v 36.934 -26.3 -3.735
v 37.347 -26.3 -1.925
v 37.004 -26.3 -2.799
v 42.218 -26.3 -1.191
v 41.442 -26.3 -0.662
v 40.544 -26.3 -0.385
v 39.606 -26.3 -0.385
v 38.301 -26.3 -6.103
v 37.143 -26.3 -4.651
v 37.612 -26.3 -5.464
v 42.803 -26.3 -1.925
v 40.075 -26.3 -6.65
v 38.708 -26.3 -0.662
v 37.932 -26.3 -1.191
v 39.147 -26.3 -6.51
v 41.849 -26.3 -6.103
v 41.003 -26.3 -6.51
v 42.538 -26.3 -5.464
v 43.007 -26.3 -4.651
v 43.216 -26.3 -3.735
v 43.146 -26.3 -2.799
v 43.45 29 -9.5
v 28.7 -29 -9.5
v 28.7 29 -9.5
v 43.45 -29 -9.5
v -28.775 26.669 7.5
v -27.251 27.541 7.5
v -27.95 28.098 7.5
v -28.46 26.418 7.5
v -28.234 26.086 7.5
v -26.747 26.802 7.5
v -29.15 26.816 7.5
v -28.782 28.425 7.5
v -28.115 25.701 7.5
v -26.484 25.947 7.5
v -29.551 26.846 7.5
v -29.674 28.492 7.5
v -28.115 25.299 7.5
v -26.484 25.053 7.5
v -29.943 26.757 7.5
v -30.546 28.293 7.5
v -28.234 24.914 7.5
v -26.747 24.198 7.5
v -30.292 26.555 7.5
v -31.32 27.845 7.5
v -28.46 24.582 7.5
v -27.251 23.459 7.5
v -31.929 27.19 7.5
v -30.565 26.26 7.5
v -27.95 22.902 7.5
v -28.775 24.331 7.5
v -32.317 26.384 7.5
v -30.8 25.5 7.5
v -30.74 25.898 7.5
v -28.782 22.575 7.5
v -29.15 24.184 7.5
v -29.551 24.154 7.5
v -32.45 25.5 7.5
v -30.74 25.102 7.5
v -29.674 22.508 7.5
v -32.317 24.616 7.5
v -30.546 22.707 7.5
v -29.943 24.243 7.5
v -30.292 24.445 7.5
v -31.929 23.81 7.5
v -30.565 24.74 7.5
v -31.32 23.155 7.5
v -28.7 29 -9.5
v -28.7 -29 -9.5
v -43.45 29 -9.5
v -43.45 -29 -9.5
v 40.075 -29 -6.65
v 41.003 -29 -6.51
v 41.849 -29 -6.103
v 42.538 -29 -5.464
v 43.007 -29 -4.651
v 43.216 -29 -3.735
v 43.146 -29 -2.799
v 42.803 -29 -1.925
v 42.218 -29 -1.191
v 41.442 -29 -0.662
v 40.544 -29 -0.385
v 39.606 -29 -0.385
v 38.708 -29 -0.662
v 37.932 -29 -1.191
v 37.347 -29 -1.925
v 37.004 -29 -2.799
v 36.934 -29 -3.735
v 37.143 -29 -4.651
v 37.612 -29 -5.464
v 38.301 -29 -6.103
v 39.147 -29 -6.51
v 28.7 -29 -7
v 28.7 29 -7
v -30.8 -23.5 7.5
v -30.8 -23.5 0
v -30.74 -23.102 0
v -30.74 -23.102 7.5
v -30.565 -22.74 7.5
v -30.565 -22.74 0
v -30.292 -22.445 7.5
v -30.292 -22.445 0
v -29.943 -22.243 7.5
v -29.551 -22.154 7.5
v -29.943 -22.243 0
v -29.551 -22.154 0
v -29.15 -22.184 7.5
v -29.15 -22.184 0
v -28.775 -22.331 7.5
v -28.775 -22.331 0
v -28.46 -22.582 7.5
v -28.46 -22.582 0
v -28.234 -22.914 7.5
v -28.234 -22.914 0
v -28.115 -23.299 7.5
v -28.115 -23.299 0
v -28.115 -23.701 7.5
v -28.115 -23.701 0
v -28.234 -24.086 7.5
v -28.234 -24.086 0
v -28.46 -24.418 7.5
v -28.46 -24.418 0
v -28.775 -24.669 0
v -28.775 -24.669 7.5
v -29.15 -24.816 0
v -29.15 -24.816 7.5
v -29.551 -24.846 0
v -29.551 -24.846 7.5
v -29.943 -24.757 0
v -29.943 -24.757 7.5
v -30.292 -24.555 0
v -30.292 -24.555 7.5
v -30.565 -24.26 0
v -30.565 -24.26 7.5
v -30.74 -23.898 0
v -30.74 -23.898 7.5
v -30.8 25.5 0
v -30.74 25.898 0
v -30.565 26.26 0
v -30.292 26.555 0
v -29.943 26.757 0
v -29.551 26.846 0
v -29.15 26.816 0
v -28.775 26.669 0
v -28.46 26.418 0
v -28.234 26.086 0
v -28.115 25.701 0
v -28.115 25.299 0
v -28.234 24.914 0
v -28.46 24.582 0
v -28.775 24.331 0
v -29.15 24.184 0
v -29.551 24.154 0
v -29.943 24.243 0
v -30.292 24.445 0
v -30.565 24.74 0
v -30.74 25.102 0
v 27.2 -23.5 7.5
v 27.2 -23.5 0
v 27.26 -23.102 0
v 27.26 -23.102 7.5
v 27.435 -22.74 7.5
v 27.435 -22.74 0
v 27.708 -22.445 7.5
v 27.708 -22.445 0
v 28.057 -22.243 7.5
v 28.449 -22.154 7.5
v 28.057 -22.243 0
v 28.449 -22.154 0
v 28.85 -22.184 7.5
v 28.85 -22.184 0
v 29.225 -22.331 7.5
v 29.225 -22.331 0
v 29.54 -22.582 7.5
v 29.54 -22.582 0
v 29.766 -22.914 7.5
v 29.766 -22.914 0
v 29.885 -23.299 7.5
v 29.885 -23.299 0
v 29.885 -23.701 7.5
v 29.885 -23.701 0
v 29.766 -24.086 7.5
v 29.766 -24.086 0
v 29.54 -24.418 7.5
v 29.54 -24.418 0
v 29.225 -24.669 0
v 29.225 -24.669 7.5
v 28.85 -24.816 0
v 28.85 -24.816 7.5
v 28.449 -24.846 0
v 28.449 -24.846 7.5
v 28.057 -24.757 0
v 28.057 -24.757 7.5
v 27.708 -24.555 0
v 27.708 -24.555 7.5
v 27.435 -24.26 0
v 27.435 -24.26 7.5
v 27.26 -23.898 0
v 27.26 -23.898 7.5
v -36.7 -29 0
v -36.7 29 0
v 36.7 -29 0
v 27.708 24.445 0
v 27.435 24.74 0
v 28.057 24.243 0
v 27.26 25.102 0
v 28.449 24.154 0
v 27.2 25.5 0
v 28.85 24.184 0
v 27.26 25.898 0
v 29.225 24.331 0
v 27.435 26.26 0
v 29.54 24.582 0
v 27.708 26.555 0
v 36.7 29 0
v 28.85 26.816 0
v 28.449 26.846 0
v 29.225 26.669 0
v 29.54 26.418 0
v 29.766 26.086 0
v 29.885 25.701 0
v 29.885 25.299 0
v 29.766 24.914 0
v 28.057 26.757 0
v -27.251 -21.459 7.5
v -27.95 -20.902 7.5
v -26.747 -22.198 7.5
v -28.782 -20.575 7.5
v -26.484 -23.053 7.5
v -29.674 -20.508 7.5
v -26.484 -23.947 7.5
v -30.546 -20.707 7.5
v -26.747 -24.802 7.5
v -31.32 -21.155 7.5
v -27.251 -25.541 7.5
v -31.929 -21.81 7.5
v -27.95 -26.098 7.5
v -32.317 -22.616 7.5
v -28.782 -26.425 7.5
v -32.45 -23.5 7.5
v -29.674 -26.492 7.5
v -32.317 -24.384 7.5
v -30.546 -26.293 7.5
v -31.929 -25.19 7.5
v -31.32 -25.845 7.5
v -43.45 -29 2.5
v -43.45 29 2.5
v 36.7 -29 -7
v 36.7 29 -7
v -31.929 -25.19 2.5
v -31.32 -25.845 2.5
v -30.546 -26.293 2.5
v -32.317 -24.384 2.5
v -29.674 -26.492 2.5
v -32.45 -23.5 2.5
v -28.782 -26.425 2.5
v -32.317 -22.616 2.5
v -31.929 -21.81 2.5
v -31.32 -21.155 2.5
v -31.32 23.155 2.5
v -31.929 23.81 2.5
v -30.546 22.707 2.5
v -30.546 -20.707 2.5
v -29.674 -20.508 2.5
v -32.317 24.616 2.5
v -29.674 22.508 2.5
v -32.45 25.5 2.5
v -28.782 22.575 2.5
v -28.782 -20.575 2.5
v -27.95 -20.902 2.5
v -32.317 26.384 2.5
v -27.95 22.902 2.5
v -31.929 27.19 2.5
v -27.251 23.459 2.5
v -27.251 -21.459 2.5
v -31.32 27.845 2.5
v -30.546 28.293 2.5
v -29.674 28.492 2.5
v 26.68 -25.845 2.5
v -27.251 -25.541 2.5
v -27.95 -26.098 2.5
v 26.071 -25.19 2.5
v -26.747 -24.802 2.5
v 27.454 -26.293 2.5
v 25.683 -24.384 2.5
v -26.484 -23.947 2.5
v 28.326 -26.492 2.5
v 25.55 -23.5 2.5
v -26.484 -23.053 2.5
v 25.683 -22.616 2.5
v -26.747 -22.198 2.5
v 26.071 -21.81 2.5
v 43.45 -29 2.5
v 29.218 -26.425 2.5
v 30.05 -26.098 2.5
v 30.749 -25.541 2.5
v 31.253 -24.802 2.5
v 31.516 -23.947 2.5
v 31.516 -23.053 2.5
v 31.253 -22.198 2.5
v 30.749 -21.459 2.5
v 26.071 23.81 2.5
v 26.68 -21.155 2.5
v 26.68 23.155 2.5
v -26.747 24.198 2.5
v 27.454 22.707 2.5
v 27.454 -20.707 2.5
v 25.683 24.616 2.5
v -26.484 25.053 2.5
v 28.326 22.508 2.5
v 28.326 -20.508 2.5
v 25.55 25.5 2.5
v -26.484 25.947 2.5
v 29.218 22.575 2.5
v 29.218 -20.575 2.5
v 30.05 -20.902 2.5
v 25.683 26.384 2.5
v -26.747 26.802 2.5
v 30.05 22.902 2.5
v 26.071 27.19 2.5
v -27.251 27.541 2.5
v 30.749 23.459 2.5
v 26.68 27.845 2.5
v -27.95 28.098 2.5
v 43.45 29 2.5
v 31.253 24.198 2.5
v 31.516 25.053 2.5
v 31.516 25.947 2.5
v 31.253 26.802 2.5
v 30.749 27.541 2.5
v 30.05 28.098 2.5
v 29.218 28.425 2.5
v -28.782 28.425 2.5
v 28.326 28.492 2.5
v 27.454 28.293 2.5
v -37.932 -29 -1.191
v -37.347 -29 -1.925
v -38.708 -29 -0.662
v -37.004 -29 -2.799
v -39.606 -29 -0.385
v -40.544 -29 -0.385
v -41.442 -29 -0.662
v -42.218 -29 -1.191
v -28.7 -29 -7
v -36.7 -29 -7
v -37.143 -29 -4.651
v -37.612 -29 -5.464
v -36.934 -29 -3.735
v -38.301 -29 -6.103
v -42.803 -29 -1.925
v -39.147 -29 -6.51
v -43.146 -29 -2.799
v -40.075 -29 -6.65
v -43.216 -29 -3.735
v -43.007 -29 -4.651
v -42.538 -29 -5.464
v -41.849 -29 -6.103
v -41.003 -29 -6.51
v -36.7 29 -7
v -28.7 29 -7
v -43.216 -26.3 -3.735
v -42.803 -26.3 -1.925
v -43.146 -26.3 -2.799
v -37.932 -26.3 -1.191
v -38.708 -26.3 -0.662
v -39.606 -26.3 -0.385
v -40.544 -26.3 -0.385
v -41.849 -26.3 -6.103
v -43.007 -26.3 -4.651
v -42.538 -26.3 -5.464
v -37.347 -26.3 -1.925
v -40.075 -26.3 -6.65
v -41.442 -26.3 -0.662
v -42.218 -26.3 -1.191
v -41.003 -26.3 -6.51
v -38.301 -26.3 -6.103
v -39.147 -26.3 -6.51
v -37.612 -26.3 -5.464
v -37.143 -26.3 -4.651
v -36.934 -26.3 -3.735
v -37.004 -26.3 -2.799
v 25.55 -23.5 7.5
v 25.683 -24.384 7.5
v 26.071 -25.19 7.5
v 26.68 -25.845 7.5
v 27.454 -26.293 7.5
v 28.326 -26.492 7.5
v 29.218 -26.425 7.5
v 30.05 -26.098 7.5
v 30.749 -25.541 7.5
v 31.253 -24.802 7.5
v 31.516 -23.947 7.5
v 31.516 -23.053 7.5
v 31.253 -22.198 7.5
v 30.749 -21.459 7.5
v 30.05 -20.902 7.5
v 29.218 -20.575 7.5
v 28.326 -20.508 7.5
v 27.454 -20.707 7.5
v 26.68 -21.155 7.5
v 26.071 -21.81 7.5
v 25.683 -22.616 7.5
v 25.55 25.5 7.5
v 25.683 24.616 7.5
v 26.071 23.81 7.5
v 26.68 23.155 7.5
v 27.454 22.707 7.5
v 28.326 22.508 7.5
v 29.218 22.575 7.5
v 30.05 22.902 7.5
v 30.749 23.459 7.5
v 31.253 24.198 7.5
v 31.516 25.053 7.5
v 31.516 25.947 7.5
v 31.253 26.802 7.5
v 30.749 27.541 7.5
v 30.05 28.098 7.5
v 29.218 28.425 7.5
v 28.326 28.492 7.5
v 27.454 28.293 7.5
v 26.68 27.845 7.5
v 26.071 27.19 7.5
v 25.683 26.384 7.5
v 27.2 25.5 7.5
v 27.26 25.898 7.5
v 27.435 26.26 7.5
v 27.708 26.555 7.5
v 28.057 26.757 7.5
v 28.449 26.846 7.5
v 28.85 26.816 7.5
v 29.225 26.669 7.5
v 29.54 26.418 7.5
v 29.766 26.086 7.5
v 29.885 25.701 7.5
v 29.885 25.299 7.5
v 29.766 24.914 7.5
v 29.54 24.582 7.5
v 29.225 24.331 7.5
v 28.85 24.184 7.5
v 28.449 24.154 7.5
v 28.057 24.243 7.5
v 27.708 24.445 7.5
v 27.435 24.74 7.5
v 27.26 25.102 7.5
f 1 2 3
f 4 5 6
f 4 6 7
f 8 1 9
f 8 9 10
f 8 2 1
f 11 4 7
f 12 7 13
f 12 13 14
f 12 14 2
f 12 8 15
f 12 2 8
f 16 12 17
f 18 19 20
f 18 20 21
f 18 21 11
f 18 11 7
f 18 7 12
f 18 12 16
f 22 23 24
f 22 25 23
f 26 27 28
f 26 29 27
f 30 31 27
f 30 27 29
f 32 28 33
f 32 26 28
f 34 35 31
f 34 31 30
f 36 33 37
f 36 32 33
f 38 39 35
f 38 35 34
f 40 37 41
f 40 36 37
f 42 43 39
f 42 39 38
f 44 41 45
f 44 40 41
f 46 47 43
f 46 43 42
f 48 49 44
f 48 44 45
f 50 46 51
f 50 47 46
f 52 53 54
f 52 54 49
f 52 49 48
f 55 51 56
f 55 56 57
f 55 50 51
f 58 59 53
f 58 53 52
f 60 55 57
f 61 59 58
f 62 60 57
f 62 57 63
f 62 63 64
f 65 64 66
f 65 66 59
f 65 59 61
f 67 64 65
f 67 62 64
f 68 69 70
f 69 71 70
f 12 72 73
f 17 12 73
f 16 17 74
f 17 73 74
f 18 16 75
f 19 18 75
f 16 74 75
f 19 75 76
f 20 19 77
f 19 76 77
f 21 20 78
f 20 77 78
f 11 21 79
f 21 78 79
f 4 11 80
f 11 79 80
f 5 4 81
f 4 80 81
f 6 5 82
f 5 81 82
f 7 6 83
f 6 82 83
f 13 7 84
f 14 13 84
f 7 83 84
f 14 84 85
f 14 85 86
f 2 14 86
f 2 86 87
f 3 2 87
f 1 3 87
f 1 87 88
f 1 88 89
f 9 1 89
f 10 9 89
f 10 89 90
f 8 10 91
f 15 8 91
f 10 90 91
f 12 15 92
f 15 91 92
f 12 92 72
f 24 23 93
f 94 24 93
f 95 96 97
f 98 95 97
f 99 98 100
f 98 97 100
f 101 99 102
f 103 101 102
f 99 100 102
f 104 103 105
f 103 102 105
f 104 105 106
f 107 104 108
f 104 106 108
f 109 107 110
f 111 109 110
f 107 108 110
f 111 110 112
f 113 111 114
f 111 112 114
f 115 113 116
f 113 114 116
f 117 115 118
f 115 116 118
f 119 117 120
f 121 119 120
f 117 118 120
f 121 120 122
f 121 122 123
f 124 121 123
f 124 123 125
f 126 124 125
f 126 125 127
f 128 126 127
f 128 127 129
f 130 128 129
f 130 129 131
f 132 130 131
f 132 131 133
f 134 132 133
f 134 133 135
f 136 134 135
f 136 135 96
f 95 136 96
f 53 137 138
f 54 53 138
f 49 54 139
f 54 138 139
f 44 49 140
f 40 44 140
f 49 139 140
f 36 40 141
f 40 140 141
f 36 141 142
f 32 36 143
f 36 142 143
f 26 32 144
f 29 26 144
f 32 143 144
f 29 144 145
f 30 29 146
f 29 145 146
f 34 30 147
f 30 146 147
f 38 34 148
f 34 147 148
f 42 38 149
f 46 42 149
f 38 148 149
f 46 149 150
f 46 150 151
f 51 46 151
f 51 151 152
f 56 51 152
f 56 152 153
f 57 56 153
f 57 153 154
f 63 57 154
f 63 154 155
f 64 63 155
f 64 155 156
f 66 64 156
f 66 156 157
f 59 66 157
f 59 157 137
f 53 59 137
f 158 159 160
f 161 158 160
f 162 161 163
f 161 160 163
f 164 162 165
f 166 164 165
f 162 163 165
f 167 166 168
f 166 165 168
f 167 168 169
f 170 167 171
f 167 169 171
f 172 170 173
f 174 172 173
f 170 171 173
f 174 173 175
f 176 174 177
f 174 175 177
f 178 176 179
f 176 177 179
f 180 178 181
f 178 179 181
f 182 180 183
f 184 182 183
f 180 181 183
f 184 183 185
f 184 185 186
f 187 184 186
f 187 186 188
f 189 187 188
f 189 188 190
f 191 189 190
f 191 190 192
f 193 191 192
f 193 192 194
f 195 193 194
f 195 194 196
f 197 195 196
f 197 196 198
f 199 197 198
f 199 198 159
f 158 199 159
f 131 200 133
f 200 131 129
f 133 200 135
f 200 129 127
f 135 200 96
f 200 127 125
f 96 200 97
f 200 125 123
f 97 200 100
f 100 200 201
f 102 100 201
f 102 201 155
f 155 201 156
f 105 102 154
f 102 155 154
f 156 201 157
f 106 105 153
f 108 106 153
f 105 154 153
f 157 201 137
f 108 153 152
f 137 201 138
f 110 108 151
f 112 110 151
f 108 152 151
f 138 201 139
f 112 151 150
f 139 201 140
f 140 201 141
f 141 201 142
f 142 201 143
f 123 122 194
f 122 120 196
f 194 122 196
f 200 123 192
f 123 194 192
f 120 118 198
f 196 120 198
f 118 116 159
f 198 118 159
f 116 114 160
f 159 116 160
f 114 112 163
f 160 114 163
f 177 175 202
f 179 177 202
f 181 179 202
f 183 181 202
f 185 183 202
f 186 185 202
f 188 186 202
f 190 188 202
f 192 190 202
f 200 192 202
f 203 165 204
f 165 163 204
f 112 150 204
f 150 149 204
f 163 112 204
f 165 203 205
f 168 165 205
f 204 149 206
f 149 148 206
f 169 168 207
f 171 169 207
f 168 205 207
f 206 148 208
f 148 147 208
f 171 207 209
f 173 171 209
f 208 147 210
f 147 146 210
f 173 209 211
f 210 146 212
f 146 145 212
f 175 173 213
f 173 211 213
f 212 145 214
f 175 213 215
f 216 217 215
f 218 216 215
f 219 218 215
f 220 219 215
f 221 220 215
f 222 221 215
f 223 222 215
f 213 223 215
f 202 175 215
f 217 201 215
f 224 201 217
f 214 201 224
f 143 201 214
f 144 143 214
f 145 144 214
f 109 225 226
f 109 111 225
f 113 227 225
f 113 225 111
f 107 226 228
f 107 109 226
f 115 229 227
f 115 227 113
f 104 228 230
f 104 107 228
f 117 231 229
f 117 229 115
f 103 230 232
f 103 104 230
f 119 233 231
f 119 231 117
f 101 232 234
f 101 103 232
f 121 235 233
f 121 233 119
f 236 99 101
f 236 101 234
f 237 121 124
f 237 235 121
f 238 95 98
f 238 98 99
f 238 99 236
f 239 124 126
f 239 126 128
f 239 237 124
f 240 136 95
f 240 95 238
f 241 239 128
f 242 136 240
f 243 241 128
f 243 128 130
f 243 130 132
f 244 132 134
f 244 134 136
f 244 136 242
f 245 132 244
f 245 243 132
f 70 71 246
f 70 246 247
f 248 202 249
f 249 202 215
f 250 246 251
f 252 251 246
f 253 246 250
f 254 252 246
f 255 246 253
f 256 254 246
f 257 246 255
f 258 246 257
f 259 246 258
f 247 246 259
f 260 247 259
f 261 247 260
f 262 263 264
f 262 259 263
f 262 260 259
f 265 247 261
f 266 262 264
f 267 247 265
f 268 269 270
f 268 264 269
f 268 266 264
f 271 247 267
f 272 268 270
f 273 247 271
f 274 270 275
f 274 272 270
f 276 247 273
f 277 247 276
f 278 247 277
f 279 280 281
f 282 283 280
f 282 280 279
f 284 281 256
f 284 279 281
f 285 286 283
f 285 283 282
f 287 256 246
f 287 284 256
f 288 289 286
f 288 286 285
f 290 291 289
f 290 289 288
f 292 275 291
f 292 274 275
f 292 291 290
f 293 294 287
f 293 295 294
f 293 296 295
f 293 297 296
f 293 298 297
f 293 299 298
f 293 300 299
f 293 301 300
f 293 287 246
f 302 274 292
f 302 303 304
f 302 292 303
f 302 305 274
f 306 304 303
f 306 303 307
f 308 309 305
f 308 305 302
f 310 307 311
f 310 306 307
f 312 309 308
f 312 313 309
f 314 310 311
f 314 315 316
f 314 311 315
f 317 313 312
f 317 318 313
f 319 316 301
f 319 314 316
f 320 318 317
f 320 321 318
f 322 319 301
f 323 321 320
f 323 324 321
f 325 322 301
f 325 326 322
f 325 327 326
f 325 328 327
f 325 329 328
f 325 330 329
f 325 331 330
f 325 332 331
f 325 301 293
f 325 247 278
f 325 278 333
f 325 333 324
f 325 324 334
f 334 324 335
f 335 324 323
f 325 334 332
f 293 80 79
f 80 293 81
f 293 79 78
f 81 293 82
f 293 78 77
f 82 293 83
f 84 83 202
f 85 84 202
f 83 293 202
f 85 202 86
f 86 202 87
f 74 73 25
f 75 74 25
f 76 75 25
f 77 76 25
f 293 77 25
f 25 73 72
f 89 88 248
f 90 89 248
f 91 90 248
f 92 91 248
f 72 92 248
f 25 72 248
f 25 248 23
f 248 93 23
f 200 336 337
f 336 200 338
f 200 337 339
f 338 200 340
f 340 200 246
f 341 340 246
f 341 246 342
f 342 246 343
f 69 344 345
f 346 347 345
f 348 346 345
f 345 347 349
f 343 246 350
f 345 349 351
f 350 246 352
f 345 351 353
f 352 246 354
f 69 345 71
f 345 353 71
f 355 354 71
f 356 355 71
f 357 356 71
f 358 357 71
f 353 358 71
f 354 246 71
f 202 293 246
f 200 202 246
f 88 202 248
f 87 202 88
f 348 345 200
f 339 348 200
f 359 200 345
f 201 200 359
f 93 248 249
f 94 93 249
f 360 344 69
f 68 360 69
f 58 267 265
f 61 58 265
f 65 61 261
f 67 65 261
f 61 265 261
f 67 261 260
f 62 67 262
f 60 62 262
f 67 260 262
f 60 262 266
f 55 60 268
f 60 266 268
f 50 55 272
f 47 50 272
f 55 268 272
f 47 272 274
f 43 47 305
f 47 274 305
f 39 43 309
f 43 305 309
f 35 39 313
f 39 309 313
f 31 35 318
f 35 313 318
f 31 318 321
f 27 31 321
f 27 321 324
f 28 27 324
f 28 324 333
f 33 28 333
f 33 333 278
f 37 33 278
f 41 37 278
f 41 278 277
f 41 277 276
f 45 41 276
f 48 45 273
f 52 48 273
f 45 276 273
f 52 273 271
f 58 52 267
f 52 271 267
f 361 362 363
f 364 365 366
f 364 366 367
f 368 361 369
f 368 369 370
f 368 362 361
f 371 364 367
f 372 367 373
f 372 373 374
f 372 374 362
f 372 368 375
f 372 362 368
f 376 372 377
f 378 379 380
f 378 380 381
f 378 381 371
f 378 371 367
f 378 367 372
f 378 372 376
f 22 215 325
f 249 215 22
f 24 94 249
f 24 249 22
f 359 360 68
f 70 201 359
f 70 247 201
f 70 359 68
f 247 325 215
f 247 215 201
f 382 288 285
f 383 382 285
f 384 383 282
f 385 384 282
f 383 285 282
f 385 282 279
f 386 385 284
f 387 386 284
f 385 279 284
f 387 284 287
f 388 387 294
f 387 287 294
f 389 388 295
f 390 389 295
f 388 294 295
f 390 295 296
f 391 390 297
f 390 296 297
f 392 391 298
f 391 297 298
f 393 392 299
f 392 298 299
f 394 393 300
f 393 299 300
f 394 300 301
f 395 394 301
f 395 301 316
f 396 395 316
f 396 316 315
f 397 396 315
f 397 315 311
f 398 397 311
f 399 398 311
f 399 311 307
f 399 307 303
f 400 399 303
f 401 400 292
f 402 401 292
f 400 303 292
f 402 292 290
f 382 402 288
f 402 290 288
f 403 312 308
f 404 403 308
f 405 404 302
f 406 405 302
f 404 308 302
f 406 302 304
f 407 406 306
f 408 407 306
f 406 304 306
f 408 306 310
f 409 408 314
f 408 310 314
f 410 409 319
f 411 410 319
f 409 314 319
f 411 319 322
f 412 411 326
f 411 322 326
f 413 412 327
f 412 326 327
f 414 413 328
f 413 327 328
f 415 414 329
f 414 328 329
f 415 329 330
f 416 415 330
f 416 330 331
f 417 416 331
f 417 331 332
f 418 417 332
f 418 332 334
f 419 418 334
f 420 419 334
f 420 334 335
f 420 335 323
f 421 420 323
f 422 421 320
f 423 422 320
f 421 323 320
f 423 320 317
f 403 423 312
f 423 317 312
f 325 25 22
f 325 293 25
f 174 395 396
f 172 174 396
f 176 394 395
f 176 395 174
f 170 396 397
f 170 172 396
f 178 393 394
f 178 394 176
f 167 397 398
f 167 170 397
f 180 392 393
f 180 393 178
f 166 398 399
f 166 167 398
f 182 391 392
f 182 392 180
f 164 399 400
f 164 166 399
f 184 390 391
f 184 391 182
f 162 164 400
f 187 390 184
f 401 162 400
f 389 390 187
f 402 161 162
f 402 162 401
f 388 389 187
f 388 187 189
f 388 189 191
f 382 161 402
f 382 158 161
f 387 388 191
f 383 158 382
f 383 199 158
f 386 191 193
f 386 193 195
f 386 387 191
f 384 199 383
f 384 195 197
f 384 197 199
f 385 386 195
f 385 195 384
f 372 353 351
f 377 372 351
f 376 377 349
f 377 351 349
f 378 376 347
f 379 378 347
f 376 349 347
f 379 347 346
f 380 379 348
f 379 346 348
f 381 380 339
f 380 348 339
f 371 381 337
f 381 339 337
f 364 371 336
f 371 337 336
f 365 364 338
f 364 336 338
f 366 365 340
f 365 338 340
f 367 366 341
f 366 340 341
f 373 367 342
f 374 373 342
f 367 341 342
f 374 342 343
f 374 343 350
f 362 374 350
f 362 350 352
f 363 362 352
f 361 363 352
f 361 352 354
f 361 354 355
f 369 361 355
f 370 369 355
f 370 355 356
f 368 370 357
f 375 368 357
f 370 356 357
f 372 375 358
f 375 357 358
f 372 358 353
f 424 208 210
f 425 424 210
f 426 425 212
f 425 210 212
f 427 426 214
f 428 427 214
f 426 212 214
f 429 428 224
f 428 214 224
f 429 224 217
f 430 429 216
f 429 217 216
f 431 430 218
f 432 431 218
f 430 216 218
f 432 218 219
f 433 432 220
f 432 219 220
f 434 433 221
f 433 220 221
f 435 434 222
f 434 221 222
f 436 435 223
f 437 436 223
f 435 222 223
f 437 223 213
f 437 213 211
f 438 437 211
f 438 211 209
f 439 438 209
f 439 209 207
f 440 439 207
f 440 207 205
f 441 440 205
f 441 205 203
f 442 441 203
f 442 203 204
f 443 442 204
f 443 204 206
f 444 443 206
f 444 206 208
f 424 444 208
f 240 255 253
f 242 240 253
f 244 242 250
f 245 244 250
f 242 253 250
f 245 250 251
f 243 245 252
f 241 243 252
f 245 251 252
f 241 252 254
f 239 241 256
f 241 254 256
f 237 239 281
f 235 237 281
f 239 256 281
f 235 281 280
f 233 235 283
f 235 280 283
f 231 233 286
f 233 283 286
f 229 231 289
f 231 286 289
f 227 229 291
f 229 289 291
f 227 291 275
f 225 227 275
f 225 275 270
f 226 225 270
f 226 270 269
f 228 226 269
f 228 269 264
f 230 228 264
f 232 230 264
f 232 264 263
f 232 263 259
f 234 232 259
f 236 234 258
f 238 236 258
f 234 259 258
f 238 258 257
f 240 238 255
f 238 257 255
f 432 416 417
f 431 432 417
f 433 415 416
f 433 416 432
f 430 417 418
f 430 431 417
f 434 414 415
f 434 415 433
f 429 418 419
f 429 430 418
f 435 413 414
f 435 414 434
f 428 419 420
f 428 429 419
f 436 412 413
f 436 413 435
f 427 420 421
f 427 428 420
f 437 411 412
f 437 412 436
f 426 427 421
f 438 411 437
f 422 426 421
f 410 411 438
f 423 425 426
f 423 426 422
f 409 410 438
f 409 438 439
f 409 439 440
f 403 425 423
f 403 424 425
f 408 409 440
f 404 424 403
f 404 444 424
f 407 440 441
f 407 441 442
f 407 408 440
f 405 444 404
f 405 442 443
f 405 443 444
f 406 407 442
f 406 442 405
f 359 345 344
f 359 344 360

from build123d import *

# Parameters (mm, degrees)
SKETCH1_W              = 86.9
SKETCH1_H              = 58
BOSS_EXTRUDE1_DEPTH    = 2.5
SKETCH2_R              = 3
BOSS_EXTRUDE2_DEPTH    = 5
LPATTERN1_COUNT        = 2
LPATTERN1_PITCH        = 49
M2_5_CLEARANCE_HOLE1_D = 2.7
SKETCH6_W              = 6.75
SKETCH6_H              = 58
BOSS_EXTRUDE3_DEPTH    = 9.5
SKETCH7_W              = 2.5
SKETCH7_H              = 58
BOSS_EXTRUDE4_DEPTH    = 8
SKETCH8_W              = 2.5
SKETCH8_H              = 58
BOSS_EXTRUDE5_DEPTH    = 8
SKETCH9_R              = 3.15
CUT_EXTRUDE1_DEPTH     = 2.7


with BuildPart() as part:
    # Sketch1 → Boss-Extrude1 (new body)
    with BuildSketch(Plane.XY):
        Rectangle(SKETCH1_W, SKETCH1_H)
    extrude(amount=BOSS_EXTRUDE1_DEPTH)

    # Sketch2 → Boss-Extrude2 (add)
    with BuildSketch(Plane.XY.offset(2.5)):
        with Locations(Location((-29.45, 25.5, 0), (0, 0, 180))):
            Circle(SKETCH2_R)
        with Locations(Location((28.55, 25.5, 0), (0, 0, 180))):
            Circle(SKETCH2_R)
    boss_extrude2 = extrude(amount=BOSS_EXTRUDE2_DEPTH)

    # LPattern1: Boss-Extrude2 ×2
    with Locations(*[(0, -i * LPATTERN1_PITCH, 0) for i in range(1, LPATTERN1_COUNT)]):
        add(boss_extrude2)

    # M2.5 Clearance Hole1 (through all)
    with Locations(Plane.XY.offset(7.5)):
        with Locations((-29.45, 25.5), (-29.45, -23.5), (28.55, 25.5), (28.55, -23.5)):
            Hole(M2_5_CLEARANCE_HOLE1_D / 2)

    # Sketch6 → Boss-Extrude3 (add)
    with BuildSketch(Plane(origin=(0, 0, 0), x_dir=(-1, 0, 0), z_dir=(0, 0, -1))):
        with Locations((-40.075, 0)):
            Rectangle(SKETCH6_W, SKETCH6_H)
        with Locations((40.075, 0)):
            Rectangle(SKETCH6_W, SKETCH6_H)
    extrude(amount=BOSS_EXTRUDE3_DEPTH)

    # Sketch7 → Boss-Extrude4 (add)
    with BuildSketch(Plane.ZY.offset(-36.7)):
        with Locations((-8.25, 0)):
            Rectangle(SKETCH7_W, SKETCH7_H)
    extrude(amount=BOSS_EXTRUDE4_DEPTH)

    # Sketch8 → Boss-Extrude5 (add)
    with BuildSketch(Plane(origin=(-36.7, 0, 0), x_dir=(0, 0, -1), z_dir=(1, 0, 0))):
        with Locations((8.25, 0)):
            Rectangle(SKETCH8_W, SKETCH8_H)
    extrude(amount=BOSS_EXTRUDE5_DEPTH)

    # Sketch9 → Cut-Extrude1 (cut)
    with BuildSketch(Plane.XZ.offset(29)):
        with Locations(Location((-40.075, -3.5, 0), (0, 0, 270))):
            Circle(SKETCH9_R)
        with Locations(Location((40.075, -3.5, 0), (0, 0, 270))):
            Circle(SKETCH9_R)
    extrude(amount=-CUT_EXTRUDE1_DEPTH, mode=Mode.SUBTRACT)


solid = part.part
